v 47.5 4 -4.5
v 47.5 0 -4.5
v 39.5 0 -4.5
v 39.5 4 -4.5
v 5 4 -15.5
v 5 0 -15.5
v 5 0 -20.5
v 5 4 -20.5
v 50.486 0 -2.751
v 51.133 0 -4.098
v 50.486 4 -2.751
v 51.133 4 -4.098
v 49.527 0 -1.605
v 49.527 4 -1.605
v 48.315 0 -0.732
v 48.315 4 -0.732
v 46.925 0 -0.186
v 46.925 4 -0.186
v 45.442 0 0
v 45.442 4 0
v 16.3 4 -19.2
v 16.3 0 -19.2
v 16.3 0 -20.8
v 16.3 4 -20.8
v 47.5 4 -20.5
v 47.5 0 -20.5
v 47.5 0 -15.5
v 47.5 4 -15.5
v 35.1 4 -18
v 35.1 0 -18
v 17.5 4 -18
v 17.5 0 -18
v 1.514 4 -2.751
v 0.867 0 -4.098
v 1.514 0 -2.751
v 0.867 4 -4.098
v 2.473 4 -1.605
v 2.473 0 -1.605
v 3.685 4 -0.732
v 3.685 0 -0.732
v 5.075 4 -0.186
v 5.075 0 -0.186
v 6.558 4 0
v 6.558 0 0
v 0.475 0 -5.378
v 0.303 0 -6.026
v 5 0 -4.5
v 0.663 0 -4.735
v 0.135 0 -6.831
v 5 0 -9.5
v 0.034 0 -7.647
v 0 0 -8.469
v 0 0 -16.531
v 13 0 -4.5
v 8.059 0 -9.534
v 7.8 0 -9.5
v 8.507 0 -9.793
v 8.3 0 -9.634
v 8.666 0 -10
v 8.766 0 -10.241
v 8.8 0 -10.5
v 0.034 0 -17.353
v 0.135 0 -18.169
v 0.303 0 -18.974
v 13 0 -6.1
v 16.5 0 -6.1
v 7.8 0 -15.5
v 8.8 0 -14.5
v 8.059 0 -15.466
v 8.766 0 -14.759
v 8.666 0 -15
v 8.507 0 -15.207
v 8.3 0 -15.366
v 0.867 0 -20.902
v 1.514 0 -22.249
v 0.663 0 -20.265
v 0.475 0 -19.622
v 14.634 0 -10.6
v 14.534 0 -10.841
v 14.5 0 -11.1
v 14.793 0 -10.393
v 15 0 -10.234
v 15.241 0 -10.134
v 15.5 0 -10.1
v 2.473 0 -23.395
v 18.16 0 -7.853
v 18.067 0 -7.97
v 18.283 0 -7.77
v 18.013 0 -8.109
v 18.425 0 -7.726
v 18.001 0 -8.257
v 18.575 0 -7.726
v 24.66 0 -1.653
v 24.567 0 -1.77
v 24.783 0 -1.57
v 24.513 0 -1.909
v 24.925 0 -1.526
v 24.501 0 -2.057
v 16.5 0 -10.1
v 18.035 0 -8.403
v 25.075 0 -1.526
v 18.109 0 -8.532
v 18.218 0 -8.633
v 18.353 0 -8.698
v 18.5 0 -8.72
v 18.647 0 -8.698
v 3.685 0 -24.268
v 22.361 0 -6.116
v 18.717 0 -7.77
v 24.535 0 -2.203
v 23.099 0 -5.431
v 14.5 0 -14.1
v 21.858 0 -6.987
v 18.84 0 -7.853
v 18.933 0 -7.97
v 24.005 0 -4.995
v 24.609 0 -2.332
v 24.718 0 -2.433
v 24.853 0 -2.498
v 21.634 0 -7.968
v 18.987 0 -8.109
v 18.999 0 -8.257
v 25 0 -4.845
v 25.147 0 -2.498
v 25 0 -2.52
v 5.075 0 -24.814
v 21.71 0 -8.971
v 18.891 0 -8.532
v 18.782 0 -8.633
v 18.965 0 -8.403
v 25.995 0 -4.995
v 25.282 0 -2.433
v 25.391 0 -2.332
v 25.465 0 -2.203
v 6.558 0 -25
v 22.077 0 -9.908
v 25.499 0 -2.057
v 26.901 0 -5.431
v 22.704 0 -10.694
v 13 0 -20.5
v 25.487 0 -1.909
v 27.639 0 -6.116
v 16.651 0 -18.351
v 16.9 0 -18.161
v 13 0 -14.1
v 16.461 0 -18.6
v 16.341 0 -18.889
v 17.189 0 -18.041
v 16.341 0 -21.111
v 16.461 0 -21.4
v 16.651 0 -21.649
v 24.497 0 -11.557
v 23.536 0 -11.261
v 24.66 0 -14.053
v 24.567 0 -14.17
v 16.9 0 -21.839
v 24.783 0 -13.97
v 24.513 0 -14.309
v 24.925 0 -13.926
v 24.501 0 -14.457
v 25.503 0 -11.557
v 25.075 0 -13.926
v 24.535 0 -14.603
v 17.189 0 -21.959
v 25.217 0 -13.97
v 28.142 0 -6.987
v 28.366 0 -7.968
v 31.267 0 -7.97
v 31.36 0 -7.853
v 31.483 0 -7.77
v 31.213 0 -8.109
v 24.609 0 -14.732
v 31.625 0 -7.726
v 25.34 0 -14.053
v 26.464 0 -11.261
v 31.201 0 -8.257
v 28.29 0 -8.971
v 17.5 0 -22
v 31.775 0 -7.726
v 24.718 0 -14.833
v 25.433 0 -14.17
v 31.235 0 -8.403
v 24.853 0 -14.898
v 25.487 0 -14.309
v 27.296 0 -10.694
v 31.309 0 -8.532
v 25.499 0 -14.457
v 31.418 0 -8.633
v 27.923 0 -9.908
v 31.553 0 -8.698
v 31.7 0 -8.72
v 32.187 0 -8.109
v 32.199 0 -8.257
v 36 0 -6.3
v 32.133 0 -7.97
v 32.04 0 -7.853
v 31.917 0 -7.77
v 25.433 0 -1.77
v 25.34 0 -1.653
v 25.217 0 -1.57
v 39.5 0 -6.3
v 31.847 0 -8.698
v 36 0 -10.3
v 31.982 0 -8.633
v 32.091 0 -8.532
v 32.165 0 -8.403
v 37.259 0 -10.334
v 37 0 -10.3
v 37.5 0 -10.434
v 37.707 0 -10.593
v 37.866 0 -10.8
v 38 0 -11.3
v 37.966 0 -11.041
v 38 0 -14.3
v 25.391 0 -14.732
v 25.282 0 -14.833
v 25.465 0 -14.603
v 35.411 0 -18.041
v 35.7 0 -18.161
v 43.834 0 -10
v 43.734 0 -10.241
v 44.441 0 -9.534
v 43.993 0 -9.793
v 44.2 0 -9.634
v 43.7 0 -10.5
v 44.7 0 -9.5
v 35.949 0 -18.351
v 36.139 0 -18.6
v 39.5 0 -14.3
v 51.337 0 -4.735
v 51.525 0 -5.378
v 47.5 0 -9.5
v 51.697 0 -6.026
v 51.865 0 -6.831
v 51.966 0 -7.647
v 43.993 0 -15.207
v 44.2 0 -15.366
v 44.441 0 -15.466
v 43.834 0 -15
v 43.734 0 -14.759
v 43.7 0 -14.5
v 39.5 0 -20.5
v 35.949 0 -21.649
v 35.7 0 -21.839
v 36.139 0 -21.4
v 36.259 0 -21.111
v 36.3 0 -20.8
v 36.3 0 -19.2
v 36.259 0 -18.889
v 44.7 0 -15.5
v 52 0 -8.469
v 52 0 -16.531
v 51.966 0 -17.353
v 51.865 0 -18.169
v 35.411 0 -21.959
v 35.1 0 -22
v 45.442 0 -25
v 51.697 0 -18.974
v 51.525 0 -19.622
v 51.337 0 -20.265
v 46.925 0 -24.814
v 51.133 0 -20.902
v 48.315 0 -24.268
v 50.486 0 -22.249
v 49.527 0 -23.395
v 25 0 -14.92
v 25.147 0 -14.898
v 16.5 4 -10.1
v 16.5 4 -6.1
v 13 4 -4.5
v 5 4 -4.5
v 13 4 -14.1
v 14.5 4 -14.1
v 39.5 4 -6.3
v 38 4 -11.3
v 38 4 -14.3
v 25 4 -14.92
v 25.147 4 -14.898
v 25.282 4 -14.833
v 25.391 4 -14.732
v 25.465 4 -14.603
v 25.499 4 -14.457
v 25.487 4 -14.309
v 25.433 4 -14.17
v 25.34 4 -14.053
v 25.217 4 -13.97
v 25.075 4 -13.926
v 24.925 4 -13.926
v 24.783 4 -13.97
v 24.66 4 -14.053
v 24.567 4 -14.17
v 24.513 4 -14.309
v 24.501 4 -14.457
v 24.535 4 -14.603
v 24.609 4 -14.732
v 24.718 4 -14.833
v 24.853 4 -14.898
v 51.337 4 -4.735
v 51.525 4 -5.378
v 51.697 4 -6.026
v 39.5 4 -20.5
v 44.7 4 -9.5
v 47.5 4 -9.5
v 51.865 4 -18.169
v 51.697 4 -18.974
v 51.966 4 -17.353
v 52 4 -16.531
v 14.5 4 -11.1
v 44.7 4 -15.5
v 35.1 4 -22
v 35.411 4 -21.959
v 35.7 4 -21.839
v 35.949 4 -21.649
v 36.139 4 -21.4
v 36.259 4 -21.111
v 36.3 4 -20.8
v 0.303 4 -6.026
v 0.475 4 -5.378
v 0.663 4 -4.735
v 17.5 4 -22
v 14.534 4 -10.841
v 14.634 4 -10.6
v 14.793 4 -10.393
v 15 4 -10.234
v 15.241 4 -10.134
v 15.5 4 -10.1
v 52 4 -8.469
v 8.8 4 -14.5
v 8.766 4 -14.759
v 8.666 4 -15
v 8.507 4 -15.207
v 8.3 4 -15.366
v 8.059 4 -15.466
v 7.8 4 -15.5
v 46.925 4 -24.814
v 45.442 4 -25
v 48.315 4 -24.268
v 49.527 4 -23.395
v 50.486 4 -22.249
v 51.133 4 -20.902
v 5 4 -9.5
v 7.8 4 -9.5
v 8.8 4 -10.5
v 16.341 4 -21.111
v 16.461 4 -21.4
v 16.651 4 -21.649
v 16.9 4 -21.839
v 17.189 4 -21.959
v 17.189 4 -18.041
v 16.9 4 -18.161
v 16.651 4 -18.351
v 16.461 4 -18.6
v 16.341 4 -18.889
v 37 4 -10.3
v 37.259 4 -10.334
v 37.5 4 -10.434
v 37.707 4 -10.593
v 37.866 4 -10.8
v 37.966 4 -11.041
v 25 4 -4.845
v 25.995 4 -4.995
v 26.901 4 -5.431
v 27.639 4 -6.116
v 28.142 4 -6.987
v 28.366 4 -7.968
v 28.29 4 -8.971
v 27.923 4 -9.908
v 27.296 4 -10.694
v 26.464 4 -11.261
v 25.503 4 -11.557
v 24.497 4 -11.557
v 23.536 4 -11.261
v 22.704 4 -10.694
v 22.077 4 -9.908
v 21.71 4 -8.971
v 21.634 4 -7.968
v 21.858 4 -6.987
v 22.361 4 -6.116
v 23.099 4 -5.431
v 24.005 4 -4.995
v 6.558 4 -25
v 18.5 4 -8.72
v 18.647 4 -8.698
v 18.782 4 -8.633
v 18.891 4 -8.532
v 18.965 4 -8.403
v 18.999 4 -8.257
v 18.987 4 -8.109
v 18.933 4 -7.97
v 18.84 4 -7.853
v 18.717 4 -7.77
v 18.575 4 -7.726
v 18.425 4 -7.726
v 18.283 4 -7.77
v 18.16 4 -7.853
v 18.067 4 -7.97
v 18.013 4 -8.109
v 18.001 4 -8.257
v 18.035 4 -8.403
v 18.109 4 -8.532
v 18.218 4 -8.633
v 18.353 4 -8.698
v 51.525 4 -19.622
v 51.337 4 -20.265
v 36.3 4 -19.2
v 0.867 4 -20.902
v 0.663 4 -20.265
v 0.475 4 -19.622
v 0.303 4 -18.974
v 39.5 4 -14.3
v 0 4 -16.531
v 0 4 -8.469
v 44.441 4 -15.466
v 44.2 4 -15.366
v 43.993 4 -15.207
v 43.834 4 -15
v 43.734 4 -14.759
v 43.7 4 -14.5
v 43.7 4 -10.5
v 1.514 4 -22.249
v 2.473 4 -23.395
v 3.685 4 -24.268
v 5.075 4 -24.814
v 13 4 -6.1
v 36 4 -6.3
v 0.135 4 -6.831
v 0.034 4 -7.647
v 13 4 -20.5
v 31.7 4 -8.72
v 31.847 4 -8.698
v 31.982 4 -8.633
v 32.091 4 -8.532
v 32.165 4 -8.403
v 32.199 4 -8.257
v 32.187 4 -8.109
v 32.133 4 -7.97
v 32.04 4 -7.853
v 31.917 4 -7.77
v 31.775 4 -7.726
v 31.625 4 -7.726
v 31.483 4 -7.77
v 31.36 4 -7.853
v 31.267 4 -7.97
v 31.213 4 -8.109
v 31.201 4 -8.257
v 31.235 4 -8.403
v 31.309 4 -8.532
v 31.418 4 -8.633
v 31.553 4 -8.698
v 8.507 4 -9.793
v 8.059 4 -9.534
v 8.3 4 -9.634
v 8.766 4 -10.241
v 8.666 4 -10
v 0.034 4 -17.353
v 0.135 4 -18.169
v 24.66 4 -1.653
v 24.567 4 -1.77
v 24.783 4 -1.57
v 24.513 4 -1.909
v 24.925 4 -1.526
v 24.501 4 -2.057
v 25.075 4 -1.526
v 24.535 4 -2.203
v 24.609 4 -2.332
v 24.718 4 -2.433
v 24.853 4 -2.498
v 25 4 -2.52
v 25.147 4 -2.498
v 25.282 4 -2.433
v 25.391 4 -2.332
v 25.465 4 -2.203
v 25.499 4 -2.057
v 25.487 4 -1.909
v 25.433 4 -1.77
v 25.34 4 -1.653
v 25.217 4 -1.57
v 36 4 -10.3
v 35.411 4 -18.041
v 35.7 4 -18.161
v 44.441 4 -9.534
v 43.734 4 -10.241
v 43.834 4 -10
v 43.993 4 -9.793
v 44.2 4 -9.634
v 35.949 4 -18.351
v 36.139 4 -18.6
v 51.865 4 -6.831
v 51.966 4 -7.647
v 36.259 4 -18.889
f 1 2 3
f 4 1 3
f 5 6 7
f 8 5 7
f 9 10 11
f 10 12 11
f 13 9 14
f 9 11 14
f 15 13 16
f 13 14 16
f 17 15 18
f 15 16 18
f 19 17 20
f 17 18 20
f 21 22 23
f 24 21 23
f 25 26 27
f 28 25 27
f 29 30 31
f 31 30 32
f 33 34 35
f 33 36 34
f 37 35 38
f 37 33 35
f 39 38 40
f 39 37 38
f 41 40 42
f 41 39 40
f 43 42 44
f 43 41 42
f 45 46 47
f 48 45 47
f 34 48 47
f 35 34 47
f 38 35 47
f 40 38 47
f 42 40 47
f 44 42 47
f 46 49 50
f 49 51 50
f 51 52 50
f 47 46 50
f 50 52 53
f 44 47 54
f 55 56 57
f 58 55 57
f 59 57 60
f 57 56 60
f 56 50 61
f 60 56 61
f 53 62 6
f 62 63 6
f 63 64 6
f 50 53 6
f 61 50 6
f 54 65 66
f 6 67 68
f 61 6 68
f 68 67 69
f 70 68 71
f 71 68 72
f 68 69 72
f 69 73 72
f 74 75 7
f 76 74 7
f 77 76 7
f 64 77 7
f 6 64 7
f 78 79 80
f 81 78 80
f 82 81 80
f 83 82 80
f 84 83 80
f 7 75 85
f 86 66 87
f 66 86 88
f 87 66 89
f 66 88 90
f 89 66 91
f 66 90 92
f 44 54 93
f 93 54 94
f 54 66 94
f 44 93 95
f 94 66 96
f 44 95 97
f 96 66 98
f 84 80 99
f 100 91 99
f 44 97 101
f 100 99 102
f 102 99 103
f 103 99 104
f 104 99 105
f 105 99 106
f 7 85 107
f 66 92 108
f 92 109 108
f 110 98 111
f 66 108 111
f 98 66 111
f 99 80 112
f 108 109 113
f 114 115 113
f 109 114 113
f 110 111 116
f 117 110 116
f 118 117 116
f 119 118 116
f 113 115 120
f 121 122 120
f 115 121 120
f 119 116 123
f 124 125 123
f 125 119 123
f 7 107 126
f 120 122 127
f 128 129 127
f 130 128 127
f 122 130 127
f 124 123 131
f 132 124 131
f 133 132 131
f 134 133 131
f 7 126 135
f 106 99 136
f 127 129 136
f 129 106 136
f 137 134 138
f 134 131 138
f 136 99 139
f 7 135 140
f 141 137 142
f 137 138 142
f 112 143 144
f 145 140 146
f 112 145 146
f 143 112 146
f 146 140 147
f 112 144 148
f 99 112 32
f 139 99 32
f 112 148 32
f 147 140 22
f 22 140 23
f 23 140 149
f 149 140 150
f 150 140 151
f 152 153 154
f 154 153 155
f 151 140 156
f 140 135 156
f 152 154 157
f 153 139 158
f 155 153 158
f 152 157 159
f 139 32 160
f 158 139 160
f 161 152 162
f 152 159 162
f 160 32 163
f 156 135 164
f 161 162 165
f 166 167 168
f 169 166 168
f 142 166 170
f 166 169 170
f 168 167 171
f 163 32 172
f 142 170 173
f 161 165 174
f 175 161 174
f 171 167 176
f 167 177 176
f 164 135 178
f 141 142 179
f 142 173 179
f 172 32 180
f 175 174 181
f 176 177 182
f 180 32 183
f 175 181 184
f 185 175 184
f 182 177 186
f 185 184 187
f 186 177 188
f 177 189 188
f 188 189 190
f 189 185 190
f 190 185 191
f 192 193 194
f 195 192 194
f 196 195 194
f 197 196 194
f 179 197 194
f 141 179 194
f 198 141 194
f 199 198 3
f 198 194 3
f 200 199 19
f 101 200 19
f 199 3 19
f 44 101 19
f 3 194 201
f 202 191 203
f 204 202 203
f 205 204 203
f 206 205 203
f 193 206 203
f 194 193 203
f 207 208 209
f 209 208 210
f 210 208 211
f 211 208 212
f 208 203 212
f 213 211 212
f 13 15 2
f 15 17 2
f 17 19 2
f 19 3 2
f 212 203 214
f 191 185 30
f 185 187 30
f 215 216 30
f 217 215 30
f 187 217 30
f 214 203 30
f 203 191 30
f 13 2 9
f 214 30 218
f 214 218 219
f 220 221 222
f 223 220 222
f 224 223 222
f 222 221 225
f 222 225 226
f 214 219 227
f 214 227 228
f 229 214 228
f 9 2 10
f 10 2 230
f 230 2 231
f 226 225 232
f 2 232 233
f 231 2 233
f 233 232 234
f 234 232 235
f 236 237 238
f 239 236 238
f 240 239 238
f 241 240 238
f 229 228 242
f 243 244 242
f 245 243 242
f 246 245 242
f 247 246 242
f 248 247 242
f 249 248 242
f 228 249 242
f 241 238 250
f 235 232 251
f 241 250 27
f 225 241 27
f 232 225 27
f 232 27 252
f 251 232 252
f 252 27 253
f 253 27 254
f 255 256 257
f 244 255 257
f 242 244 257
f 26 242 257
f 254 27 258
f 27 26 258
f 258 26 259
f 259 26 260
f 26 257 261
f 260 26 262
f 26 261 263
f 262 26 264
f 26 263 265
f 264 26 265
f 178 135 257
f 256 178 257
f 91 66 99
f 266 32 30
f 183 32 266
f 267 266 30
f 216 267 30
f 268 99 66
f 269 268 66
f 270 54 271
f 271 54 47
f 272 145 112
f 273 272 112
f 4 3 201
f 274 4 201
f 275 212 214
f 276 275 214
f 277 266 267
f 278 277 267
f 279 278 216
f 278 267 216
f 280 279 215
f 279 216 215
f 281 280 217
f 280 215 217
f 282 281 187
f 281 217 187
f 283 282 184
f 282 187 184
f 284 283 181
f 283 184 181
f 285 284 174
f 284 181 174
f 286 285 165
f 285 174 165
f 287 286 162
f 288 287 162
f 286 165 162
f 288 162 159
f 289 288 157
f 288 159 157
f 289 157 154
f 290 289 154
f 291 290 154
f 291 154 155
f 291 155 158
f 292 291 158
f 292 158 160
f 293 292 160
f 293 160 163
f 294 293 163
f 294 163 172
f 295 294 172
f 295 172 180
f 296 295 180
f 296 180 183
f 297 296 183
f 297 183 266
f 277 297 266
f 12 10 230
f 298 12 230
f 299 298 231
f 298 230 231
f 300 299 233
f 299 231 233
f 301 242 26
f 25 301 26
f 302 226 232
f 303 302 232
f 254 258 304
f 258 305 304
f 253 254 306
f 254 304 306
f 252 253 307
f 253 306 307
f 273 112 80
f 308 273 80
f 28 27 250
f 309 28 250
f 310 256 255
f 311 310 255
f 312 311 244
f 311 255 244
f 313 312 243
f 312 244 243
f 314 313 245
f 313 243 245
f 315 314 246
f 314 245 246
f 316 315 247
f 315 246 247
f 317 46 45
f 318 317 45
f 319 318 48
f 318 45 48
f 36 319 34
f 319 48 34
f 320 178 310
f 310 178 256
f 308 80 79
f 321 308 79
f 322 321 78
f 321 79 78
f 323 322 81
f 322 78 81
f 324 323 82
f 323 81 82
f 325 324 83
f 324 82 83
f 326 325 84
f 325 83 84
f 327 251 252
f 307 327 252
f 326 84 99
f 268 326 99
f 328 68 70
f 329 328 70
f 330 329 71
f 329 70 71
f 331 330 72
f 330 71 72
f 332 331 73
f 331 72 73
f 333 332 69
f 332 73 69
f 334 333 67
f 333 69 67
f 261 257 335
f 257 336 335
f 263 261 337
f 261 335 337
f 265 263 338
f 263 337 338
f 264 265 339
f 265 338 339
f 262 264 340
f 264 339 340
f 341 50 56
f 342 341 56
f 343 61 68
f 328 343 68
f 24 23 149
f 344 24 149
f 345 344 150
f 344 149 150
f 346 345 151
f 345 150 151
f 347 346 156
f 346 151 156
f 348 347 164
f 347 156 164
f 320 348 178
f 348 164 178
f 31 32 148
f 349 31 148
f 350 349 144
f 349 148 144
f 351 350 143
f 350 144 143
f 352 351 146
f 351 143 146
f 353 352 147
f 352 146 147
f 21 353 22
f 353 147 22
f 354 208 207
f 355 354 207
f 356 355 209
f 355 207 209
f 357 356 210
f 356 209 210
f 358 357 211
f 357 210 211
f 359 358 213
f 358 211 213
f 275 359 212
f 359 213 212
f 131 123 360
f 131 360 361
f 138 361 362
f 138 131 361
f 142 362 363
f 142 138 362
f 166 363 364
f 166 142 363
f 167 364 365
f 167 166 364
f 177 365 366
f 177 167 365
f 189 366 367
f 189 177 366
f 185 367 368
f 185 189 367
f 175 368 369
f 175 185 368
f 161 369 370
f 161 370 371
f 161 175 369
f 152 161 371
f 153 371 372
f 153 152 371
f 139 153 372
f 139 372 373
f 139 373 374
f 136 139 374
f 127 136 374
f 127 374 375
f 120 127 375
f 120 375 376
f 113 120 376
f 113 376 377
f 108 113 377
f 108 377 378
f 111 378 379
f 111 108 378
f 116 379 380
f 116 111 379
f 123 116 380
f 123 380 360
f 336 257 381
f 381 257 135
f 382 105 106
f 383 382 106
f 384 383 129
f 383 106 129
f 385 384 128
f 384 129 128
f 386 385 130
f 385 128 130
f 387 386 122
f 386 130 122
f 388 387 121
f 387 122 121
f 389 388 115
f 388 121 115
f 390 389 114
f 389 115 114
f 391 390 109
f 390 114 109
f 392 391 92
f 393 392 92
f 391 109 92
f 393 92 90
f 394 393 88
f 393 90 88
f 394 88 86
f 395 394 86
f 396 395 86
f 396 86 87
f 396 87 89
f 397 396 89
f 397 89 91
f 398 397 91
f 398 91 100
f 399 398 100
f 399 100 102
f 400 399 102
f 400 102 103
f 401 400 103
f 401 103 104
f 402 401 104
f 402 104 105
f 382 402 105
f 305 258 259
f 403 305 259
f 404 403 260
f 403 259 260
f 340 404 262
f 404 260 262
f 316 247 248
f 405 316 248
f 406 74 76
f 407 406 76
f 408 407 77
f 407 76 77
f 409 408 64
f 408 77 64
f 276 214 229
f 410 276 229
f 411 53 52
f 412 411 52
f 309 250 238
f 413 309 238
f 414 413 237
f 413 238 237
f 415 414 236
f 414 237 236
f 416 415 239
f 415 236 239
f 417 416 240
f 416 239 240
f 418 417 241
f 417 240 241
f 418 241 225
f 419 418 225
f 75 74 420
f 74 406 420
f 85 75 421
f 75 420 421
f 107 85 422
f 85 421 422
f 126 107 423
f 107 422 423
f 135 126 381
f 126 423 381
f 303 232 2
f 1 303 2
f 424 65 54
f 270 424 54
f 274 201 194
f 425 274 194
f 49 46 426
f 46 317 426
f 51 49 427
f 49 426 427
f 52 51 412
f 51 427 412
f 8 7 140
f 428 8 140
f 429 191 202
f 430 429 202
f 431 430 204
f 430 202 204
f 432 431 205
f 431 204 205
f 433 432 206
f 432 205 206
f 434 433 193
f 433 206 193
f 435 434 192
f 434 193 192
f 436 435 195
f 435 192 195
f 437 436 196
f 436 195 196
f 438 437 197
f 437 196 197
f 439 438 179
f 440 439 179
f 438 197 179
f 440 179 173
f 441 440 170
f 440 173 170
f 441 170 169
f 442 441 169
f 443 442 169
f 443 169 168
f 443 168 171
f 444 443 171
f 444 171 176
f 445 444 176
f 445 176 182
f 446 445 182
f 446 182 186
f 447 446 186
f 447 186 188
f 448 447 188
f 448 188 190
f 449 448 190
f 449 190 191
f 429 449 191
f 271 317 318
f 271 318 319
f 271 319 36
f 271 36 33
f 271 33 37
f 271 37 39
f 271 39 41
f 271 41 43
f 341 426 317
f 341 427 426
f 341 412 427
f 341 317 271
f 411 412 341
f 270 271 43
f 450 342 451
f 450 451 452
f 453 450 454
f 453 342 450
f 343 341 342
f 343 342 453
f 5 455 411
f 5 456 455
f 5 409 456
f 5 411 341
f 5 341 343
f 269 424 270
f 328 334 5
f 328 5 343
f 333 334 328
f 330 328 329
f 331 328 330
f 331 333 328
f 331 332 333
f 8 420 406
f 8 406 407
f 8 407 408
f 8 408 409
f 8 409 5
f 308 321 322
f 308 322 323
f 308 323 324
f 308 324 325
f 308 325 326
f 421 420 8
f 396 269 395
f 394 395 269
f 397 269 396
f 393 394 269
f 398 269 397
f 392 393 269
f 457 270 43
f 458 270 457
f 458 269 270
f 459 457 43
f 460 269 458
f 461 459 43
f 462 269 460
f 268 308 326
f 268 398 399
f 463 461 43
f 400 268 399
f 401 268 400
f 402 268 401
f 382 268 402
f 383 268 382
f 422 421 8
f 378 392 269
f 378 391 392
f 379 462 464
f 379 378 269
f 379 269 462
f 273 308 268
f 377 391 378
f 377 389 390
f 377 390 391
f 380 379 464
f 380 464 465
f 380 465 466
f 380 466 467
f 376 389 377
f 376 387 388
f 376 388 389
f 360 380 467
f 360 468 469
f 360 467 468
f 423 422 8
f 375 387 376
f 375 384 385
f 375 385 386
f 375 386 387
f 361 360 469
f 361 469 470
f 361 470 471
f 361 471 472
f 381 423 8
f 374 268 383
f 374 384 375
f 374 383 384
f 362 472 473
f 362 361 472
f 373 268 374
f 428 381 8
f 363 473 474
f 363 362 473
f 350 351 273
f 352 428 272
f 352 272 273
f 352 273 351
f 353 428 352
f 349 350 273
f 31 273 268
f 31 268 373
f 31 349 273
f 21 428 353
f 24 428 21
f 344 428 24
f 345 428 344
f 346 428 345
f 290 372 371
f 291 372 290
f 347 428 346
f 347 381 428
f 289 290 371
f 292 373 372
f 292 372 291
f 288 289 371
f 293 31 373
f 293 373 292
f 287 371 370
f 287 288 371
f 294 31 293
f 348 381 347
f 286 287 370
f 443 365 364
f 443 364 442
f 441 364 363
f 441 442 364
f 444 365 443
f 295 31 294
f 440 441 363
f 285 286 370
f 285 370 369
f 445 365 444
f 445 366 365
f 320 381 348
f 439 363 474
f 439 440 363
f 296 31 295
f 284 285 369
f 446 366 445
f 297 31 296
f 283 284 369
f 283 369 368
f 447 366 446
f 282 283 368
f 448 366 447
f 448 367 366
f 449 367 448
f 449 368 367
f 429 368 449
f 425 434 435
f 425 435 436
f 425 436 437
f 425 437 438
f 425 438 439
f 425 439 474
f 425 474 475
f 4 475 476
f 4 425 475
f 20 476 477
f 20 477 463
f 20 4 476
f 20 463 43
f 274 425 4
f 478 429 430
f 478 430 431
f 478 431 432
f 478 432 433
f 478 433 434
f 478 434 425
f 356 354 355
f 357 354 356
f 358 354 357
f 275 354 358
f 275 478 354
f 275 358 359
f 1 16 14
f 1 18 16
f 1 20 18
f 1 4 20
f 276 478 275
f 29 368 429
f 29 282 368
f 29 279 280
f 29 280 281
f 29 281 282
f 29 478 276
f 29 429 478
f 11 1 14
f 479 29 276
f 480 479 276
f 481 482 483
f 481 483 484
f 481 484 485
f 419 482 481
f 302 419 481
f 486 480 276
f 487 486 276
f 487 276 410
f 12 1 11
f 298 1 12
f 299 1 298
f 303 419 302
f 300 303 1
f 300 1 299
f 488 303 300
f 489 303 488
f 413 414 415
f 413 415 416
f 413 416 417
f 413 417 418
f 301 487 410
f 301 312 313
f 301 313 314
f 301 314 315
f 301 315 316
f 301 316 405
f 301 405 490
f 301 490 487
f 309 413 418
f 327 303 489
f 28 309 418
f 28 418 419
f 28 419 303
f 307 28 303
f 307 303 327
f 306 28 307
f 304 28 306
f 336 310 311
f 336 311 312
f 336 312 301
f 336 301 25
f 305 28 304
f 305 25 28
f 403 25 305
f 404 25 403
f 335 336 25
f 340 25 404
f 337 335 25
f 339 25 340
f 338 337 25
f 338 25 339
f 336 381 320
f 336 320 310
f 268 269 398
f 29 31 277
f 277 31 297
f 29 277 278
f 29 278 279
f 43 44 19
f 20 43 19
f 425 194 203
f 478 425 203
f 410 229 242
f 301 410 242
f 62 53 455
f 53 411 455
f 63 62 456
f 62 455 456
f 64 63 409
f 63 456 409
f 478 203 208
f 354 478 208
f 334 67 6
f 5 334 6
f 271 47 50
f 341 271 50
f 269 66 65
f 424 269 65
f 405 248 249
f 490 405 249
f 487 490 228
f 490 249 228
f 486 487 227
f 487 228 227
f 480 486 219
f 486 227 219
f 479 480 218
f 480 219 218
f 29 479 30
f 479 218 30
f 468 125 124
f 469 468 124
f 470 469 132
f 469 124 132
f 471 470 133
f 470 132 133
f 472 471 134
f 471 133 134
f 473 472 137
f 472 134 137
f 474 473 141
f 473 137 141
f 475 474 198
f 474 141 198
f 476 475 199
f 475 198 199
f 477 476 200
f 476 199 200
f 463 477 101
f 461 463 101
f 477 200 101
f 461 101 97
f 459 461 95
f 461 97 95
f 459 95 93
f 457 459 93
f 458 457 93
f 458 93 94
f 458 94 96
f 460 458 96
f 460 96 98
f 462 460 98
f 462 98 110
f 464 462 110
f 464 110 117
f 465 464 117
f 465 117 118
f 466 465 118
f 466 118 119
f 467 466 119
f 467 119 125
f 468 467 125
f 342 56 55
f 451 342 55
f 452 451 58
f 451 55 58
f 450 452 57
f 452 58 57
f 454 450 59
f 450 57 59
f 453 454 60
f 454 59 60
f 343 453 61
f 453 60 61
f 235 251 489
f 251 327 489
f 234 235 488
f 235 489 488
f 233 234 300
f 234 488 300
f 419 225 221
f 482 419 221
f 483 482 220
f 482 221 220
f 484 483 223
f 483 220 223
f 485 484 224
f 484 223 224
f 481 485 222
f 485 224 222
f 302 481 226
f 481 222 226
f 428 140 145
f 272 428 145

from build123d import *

# Parameters (mm, degrees)
SCHIZZO1_R                   = 3.375
ESTRUSIONE_ESTRUSIONE1_DEPTH = 4
RACCORDO1_R                  = 6
RACCORDO4_R                  = 6
RACCORDO5_R                  = 6
RACCORDO6_R                  = 6
RACCORDO8_R                  = 10
RACCORDO9_R                  = 10
RACCORDO10_R                 = 10
RACCORDO11_R                 = 10
SCHIZZO2_R                   = 0.5
TAGLIO_ESTRUSIONE1_DEPTH     = 58.835974964


with BuildPart() as part:
    # Schizzo1 → Estrusione-Estrusione1 (new body)
    with BuildSketch(Plane(origin=(0, 0, 0), x_dir=(1, 0, 0), z_dir=(0, 1, 0))):
        with BuildLine():
            ThreePointArc((0, 7.376524617), (1.042643641, 3.590434154), (2.633357109, 0))
            Line((2.633357109, 0), (49.366642891, 0))
            ThreePointArc((49.366642891, 0), (50.957356359, 3.590434154), (52, 7.376524617))
            Line((52, 7.376524617), (52, 17.623475383))
            ThreePointArc((52, 17.623475383), (50.957356359, 21.409565846), (49.366642891, 25))
            Line((49.366642891, 25), (2.633357109, 25))
            ThreePointArc((2.633357109, 25), (1.042643641, 21.409565846), (0, 17.623475383))
            Line((0, 17.623475383), (0, 7.376524617))
        make_face()
        with BuildLine():
            Line((17.5, 22), (35.1, 22))
            ThreePointArc((35.1, 22), (35.948528137, 21.648528137), (36.3, 20.8))
            Line((36.3, 20.8), (36.3, 19.2))
            ThreePointArc((36.3, 19.2), (35.948528137, 18.351471863), (35.1, 18))
            Line((35.1, 18), (17.5, 18))
            ThreePointArc((17.5, 18), (16.651471863, 18.351471863), (16.3, 19.2))
            Line((16.3, 19.2), (16.3, 20.8))
            ThreePointArc((16.3, 20.8), (16.651471863, 21.648528137), (17.5, 22))
        make_face(mode=Mode.SUBTRACT)
        with Locations(Location((25, 8.22, 0), (0, 0, 270))):
            Circle(SCHIZZO1_R, mode=Mode.SUBTRACT)
        with BuildLine():
            Line((5, 15.5), (5, 20.5))
            Line((5, 20.5), (13, 20.5))
            Line((13, 20.5), (13, 14.1))
            Line((13, 14.1), (14.5, 14.1))
            Line((14.5, 14.1), (14.5, 11.1))
            ThreePointArc((14.5, 11.1), (14.792893219, 10.392893219), (15.5, 10.1))
            Line((15.5, 10.1), (16.5, 10.1))
            Line((16.5, 10.1), (16.5, 6.1))
            Line((16.5, 6.1), (13, 6.1))
            Line((13, 6.1), (13, 4.5))
            Line((13, 4.5), (5, 4.5))
            Line((5, 4.5), (5, 9.5))
            Line((5, 9.5), (7.8, 9.5))
            ThreePointArc((7.8, 9.5), (8.507106781, 9.792893219), (8.8, 10.5))
            Line((8.8, 10.5), (8.8, 14.5))
            ThreePointArc((8.8, 14.5), (8.507106781, 15.207106781), (7.8, 15.5))
            Line((7.8, 15.5), (5, 15.5))
        make_face(mode=Mode.SUBTRACT)
        with BuildLine():
            Line((36, 10.3), (37, 10.3))
            ThreePointArc((37, 10.3), (37.707106781, 10.592893219), (38, 11.3))
            Line((38, 11.3), (38, 14.3))
            Line((38, 14.3), (39.5, 14.3))
            Line((39.5, 14.3), (39.5, 20.5))
            Line((39.5, 20.5), (47.5, 20.5))
            Line((47.5, 20.5), (47.5, 15.5))
            Line((47.5, 15.5), (44.7, 15.5))
            ThreePointArc((44.7, 15.5), (43.992893219, 15.207106781), (43.7, 14.5))
            Line((43.7, 14.5), (43.7, 10.5))
            ThreePointArc((43.7, 10.5), (43.992893219, 9.792893219), (44.7, 9.5))
            Line((44.7, 9.5), (47.5, 9.5))
            Line((47.5, 9.5), (47.5, 4.5))
            Line((47.5, 4.5), (39.5, 4.5))
            Line((39.5, 4.5), (39.5, 6.3))
            Line((39.5, 6.3), (36, 6.3))
            Line((36, 6.3), (36, 10.3))
        make_face(mode=Mode.SUBTRACT)
    extrude(amount=ESTRUSIONE_ESTRUSIONE1_DEPTH)

    # Raccordo1
    raccordo1_edges = [part.edges().sort_by_distance(p)[0] for p in [
        (2.633357109, 2, -25),
    ]]
    fillet(raccordo1_edges, radius=RACCORDO1_R)

    # Raccordo4
    raccordo4_edges = [part.edges().sort_by_distance(p)[0] for p in [
        (2.633357109, 2, 0),
    ]]
    fillet(raccordo4_edges, radius=RACCORDO4_R)

    # Raccordo5
    raccordo5_edges = [part.edges().sort_by_distance(p)[0] for p in [
        (49.366642891, 2, -25),
    ]]
    fillet(raccordo5_edges, radius=RACCORDO5_R)

    # Raccordo6
    raccordo6_edges = [part.edges().sort_by_distance(p)[0] for p in [
        (49.366642891, 2, 0),
    ]]
    fillet(raccordo6_edges, radius=RACCORDO6_R)

    # Raccordo8
    raccordo8_edges = [part.edges().sort_by_distance(p)[0] for p in [
        (0, 2, -7.376524617),
    ]]
    fillet(raccordo8_edges, radius=RACCORDO8_R)

    # Raccordo9
    raccordo9_edges = [part.edges().sort_by_distance(p)[0] for p in [
        (0, 2, -17.623475383),
    ]]
    fillet(raccordo9_edges, radius=RACCORDO9_R)

    # Raccordo10
    raccordo10_edges = [part.edges().sort_by_distance(p)[0] for p in [
        (52, 2, -17.623475383),
    ]]
    fillet(raccordo10_edges, radius=RACCORDO10_R)

    # Raccordo11
    raccordo11_edges = [part.edges().sort_by_distance(p)[0] for p in [
        (52, 2, -7.376524617),
    ]]
    fillet(raccordo11_edges, radius=RACCORDO11_R)

    # Schizzo2 → Taglio-Estrusione1 (cut, through all)
    with BuildSketch(Plane.XZ):
        with Locations(Location((25, -14.42, 0), (0, 0, 270))):
            Circle(SCHIZZO2_R)
        with Locations(Location((31.7, -8.22, 0), (0, 0, 270))):
            Circle(SCHIZZO2_R)
        with Locations(Location((18.5, -8.22, 0), (0, 0, 270))):
            Circle(SCHIZZO2_R)
        with Locations(Location((25, -2.02, 0), (0, 0, 270))):
            Circle(SCHIZZO2_R)
    extrude(amount=-TAGLIO_ESTRUSIONE1_DEPTH, mode=Mode.SUBTRACT)


solid = part.part
